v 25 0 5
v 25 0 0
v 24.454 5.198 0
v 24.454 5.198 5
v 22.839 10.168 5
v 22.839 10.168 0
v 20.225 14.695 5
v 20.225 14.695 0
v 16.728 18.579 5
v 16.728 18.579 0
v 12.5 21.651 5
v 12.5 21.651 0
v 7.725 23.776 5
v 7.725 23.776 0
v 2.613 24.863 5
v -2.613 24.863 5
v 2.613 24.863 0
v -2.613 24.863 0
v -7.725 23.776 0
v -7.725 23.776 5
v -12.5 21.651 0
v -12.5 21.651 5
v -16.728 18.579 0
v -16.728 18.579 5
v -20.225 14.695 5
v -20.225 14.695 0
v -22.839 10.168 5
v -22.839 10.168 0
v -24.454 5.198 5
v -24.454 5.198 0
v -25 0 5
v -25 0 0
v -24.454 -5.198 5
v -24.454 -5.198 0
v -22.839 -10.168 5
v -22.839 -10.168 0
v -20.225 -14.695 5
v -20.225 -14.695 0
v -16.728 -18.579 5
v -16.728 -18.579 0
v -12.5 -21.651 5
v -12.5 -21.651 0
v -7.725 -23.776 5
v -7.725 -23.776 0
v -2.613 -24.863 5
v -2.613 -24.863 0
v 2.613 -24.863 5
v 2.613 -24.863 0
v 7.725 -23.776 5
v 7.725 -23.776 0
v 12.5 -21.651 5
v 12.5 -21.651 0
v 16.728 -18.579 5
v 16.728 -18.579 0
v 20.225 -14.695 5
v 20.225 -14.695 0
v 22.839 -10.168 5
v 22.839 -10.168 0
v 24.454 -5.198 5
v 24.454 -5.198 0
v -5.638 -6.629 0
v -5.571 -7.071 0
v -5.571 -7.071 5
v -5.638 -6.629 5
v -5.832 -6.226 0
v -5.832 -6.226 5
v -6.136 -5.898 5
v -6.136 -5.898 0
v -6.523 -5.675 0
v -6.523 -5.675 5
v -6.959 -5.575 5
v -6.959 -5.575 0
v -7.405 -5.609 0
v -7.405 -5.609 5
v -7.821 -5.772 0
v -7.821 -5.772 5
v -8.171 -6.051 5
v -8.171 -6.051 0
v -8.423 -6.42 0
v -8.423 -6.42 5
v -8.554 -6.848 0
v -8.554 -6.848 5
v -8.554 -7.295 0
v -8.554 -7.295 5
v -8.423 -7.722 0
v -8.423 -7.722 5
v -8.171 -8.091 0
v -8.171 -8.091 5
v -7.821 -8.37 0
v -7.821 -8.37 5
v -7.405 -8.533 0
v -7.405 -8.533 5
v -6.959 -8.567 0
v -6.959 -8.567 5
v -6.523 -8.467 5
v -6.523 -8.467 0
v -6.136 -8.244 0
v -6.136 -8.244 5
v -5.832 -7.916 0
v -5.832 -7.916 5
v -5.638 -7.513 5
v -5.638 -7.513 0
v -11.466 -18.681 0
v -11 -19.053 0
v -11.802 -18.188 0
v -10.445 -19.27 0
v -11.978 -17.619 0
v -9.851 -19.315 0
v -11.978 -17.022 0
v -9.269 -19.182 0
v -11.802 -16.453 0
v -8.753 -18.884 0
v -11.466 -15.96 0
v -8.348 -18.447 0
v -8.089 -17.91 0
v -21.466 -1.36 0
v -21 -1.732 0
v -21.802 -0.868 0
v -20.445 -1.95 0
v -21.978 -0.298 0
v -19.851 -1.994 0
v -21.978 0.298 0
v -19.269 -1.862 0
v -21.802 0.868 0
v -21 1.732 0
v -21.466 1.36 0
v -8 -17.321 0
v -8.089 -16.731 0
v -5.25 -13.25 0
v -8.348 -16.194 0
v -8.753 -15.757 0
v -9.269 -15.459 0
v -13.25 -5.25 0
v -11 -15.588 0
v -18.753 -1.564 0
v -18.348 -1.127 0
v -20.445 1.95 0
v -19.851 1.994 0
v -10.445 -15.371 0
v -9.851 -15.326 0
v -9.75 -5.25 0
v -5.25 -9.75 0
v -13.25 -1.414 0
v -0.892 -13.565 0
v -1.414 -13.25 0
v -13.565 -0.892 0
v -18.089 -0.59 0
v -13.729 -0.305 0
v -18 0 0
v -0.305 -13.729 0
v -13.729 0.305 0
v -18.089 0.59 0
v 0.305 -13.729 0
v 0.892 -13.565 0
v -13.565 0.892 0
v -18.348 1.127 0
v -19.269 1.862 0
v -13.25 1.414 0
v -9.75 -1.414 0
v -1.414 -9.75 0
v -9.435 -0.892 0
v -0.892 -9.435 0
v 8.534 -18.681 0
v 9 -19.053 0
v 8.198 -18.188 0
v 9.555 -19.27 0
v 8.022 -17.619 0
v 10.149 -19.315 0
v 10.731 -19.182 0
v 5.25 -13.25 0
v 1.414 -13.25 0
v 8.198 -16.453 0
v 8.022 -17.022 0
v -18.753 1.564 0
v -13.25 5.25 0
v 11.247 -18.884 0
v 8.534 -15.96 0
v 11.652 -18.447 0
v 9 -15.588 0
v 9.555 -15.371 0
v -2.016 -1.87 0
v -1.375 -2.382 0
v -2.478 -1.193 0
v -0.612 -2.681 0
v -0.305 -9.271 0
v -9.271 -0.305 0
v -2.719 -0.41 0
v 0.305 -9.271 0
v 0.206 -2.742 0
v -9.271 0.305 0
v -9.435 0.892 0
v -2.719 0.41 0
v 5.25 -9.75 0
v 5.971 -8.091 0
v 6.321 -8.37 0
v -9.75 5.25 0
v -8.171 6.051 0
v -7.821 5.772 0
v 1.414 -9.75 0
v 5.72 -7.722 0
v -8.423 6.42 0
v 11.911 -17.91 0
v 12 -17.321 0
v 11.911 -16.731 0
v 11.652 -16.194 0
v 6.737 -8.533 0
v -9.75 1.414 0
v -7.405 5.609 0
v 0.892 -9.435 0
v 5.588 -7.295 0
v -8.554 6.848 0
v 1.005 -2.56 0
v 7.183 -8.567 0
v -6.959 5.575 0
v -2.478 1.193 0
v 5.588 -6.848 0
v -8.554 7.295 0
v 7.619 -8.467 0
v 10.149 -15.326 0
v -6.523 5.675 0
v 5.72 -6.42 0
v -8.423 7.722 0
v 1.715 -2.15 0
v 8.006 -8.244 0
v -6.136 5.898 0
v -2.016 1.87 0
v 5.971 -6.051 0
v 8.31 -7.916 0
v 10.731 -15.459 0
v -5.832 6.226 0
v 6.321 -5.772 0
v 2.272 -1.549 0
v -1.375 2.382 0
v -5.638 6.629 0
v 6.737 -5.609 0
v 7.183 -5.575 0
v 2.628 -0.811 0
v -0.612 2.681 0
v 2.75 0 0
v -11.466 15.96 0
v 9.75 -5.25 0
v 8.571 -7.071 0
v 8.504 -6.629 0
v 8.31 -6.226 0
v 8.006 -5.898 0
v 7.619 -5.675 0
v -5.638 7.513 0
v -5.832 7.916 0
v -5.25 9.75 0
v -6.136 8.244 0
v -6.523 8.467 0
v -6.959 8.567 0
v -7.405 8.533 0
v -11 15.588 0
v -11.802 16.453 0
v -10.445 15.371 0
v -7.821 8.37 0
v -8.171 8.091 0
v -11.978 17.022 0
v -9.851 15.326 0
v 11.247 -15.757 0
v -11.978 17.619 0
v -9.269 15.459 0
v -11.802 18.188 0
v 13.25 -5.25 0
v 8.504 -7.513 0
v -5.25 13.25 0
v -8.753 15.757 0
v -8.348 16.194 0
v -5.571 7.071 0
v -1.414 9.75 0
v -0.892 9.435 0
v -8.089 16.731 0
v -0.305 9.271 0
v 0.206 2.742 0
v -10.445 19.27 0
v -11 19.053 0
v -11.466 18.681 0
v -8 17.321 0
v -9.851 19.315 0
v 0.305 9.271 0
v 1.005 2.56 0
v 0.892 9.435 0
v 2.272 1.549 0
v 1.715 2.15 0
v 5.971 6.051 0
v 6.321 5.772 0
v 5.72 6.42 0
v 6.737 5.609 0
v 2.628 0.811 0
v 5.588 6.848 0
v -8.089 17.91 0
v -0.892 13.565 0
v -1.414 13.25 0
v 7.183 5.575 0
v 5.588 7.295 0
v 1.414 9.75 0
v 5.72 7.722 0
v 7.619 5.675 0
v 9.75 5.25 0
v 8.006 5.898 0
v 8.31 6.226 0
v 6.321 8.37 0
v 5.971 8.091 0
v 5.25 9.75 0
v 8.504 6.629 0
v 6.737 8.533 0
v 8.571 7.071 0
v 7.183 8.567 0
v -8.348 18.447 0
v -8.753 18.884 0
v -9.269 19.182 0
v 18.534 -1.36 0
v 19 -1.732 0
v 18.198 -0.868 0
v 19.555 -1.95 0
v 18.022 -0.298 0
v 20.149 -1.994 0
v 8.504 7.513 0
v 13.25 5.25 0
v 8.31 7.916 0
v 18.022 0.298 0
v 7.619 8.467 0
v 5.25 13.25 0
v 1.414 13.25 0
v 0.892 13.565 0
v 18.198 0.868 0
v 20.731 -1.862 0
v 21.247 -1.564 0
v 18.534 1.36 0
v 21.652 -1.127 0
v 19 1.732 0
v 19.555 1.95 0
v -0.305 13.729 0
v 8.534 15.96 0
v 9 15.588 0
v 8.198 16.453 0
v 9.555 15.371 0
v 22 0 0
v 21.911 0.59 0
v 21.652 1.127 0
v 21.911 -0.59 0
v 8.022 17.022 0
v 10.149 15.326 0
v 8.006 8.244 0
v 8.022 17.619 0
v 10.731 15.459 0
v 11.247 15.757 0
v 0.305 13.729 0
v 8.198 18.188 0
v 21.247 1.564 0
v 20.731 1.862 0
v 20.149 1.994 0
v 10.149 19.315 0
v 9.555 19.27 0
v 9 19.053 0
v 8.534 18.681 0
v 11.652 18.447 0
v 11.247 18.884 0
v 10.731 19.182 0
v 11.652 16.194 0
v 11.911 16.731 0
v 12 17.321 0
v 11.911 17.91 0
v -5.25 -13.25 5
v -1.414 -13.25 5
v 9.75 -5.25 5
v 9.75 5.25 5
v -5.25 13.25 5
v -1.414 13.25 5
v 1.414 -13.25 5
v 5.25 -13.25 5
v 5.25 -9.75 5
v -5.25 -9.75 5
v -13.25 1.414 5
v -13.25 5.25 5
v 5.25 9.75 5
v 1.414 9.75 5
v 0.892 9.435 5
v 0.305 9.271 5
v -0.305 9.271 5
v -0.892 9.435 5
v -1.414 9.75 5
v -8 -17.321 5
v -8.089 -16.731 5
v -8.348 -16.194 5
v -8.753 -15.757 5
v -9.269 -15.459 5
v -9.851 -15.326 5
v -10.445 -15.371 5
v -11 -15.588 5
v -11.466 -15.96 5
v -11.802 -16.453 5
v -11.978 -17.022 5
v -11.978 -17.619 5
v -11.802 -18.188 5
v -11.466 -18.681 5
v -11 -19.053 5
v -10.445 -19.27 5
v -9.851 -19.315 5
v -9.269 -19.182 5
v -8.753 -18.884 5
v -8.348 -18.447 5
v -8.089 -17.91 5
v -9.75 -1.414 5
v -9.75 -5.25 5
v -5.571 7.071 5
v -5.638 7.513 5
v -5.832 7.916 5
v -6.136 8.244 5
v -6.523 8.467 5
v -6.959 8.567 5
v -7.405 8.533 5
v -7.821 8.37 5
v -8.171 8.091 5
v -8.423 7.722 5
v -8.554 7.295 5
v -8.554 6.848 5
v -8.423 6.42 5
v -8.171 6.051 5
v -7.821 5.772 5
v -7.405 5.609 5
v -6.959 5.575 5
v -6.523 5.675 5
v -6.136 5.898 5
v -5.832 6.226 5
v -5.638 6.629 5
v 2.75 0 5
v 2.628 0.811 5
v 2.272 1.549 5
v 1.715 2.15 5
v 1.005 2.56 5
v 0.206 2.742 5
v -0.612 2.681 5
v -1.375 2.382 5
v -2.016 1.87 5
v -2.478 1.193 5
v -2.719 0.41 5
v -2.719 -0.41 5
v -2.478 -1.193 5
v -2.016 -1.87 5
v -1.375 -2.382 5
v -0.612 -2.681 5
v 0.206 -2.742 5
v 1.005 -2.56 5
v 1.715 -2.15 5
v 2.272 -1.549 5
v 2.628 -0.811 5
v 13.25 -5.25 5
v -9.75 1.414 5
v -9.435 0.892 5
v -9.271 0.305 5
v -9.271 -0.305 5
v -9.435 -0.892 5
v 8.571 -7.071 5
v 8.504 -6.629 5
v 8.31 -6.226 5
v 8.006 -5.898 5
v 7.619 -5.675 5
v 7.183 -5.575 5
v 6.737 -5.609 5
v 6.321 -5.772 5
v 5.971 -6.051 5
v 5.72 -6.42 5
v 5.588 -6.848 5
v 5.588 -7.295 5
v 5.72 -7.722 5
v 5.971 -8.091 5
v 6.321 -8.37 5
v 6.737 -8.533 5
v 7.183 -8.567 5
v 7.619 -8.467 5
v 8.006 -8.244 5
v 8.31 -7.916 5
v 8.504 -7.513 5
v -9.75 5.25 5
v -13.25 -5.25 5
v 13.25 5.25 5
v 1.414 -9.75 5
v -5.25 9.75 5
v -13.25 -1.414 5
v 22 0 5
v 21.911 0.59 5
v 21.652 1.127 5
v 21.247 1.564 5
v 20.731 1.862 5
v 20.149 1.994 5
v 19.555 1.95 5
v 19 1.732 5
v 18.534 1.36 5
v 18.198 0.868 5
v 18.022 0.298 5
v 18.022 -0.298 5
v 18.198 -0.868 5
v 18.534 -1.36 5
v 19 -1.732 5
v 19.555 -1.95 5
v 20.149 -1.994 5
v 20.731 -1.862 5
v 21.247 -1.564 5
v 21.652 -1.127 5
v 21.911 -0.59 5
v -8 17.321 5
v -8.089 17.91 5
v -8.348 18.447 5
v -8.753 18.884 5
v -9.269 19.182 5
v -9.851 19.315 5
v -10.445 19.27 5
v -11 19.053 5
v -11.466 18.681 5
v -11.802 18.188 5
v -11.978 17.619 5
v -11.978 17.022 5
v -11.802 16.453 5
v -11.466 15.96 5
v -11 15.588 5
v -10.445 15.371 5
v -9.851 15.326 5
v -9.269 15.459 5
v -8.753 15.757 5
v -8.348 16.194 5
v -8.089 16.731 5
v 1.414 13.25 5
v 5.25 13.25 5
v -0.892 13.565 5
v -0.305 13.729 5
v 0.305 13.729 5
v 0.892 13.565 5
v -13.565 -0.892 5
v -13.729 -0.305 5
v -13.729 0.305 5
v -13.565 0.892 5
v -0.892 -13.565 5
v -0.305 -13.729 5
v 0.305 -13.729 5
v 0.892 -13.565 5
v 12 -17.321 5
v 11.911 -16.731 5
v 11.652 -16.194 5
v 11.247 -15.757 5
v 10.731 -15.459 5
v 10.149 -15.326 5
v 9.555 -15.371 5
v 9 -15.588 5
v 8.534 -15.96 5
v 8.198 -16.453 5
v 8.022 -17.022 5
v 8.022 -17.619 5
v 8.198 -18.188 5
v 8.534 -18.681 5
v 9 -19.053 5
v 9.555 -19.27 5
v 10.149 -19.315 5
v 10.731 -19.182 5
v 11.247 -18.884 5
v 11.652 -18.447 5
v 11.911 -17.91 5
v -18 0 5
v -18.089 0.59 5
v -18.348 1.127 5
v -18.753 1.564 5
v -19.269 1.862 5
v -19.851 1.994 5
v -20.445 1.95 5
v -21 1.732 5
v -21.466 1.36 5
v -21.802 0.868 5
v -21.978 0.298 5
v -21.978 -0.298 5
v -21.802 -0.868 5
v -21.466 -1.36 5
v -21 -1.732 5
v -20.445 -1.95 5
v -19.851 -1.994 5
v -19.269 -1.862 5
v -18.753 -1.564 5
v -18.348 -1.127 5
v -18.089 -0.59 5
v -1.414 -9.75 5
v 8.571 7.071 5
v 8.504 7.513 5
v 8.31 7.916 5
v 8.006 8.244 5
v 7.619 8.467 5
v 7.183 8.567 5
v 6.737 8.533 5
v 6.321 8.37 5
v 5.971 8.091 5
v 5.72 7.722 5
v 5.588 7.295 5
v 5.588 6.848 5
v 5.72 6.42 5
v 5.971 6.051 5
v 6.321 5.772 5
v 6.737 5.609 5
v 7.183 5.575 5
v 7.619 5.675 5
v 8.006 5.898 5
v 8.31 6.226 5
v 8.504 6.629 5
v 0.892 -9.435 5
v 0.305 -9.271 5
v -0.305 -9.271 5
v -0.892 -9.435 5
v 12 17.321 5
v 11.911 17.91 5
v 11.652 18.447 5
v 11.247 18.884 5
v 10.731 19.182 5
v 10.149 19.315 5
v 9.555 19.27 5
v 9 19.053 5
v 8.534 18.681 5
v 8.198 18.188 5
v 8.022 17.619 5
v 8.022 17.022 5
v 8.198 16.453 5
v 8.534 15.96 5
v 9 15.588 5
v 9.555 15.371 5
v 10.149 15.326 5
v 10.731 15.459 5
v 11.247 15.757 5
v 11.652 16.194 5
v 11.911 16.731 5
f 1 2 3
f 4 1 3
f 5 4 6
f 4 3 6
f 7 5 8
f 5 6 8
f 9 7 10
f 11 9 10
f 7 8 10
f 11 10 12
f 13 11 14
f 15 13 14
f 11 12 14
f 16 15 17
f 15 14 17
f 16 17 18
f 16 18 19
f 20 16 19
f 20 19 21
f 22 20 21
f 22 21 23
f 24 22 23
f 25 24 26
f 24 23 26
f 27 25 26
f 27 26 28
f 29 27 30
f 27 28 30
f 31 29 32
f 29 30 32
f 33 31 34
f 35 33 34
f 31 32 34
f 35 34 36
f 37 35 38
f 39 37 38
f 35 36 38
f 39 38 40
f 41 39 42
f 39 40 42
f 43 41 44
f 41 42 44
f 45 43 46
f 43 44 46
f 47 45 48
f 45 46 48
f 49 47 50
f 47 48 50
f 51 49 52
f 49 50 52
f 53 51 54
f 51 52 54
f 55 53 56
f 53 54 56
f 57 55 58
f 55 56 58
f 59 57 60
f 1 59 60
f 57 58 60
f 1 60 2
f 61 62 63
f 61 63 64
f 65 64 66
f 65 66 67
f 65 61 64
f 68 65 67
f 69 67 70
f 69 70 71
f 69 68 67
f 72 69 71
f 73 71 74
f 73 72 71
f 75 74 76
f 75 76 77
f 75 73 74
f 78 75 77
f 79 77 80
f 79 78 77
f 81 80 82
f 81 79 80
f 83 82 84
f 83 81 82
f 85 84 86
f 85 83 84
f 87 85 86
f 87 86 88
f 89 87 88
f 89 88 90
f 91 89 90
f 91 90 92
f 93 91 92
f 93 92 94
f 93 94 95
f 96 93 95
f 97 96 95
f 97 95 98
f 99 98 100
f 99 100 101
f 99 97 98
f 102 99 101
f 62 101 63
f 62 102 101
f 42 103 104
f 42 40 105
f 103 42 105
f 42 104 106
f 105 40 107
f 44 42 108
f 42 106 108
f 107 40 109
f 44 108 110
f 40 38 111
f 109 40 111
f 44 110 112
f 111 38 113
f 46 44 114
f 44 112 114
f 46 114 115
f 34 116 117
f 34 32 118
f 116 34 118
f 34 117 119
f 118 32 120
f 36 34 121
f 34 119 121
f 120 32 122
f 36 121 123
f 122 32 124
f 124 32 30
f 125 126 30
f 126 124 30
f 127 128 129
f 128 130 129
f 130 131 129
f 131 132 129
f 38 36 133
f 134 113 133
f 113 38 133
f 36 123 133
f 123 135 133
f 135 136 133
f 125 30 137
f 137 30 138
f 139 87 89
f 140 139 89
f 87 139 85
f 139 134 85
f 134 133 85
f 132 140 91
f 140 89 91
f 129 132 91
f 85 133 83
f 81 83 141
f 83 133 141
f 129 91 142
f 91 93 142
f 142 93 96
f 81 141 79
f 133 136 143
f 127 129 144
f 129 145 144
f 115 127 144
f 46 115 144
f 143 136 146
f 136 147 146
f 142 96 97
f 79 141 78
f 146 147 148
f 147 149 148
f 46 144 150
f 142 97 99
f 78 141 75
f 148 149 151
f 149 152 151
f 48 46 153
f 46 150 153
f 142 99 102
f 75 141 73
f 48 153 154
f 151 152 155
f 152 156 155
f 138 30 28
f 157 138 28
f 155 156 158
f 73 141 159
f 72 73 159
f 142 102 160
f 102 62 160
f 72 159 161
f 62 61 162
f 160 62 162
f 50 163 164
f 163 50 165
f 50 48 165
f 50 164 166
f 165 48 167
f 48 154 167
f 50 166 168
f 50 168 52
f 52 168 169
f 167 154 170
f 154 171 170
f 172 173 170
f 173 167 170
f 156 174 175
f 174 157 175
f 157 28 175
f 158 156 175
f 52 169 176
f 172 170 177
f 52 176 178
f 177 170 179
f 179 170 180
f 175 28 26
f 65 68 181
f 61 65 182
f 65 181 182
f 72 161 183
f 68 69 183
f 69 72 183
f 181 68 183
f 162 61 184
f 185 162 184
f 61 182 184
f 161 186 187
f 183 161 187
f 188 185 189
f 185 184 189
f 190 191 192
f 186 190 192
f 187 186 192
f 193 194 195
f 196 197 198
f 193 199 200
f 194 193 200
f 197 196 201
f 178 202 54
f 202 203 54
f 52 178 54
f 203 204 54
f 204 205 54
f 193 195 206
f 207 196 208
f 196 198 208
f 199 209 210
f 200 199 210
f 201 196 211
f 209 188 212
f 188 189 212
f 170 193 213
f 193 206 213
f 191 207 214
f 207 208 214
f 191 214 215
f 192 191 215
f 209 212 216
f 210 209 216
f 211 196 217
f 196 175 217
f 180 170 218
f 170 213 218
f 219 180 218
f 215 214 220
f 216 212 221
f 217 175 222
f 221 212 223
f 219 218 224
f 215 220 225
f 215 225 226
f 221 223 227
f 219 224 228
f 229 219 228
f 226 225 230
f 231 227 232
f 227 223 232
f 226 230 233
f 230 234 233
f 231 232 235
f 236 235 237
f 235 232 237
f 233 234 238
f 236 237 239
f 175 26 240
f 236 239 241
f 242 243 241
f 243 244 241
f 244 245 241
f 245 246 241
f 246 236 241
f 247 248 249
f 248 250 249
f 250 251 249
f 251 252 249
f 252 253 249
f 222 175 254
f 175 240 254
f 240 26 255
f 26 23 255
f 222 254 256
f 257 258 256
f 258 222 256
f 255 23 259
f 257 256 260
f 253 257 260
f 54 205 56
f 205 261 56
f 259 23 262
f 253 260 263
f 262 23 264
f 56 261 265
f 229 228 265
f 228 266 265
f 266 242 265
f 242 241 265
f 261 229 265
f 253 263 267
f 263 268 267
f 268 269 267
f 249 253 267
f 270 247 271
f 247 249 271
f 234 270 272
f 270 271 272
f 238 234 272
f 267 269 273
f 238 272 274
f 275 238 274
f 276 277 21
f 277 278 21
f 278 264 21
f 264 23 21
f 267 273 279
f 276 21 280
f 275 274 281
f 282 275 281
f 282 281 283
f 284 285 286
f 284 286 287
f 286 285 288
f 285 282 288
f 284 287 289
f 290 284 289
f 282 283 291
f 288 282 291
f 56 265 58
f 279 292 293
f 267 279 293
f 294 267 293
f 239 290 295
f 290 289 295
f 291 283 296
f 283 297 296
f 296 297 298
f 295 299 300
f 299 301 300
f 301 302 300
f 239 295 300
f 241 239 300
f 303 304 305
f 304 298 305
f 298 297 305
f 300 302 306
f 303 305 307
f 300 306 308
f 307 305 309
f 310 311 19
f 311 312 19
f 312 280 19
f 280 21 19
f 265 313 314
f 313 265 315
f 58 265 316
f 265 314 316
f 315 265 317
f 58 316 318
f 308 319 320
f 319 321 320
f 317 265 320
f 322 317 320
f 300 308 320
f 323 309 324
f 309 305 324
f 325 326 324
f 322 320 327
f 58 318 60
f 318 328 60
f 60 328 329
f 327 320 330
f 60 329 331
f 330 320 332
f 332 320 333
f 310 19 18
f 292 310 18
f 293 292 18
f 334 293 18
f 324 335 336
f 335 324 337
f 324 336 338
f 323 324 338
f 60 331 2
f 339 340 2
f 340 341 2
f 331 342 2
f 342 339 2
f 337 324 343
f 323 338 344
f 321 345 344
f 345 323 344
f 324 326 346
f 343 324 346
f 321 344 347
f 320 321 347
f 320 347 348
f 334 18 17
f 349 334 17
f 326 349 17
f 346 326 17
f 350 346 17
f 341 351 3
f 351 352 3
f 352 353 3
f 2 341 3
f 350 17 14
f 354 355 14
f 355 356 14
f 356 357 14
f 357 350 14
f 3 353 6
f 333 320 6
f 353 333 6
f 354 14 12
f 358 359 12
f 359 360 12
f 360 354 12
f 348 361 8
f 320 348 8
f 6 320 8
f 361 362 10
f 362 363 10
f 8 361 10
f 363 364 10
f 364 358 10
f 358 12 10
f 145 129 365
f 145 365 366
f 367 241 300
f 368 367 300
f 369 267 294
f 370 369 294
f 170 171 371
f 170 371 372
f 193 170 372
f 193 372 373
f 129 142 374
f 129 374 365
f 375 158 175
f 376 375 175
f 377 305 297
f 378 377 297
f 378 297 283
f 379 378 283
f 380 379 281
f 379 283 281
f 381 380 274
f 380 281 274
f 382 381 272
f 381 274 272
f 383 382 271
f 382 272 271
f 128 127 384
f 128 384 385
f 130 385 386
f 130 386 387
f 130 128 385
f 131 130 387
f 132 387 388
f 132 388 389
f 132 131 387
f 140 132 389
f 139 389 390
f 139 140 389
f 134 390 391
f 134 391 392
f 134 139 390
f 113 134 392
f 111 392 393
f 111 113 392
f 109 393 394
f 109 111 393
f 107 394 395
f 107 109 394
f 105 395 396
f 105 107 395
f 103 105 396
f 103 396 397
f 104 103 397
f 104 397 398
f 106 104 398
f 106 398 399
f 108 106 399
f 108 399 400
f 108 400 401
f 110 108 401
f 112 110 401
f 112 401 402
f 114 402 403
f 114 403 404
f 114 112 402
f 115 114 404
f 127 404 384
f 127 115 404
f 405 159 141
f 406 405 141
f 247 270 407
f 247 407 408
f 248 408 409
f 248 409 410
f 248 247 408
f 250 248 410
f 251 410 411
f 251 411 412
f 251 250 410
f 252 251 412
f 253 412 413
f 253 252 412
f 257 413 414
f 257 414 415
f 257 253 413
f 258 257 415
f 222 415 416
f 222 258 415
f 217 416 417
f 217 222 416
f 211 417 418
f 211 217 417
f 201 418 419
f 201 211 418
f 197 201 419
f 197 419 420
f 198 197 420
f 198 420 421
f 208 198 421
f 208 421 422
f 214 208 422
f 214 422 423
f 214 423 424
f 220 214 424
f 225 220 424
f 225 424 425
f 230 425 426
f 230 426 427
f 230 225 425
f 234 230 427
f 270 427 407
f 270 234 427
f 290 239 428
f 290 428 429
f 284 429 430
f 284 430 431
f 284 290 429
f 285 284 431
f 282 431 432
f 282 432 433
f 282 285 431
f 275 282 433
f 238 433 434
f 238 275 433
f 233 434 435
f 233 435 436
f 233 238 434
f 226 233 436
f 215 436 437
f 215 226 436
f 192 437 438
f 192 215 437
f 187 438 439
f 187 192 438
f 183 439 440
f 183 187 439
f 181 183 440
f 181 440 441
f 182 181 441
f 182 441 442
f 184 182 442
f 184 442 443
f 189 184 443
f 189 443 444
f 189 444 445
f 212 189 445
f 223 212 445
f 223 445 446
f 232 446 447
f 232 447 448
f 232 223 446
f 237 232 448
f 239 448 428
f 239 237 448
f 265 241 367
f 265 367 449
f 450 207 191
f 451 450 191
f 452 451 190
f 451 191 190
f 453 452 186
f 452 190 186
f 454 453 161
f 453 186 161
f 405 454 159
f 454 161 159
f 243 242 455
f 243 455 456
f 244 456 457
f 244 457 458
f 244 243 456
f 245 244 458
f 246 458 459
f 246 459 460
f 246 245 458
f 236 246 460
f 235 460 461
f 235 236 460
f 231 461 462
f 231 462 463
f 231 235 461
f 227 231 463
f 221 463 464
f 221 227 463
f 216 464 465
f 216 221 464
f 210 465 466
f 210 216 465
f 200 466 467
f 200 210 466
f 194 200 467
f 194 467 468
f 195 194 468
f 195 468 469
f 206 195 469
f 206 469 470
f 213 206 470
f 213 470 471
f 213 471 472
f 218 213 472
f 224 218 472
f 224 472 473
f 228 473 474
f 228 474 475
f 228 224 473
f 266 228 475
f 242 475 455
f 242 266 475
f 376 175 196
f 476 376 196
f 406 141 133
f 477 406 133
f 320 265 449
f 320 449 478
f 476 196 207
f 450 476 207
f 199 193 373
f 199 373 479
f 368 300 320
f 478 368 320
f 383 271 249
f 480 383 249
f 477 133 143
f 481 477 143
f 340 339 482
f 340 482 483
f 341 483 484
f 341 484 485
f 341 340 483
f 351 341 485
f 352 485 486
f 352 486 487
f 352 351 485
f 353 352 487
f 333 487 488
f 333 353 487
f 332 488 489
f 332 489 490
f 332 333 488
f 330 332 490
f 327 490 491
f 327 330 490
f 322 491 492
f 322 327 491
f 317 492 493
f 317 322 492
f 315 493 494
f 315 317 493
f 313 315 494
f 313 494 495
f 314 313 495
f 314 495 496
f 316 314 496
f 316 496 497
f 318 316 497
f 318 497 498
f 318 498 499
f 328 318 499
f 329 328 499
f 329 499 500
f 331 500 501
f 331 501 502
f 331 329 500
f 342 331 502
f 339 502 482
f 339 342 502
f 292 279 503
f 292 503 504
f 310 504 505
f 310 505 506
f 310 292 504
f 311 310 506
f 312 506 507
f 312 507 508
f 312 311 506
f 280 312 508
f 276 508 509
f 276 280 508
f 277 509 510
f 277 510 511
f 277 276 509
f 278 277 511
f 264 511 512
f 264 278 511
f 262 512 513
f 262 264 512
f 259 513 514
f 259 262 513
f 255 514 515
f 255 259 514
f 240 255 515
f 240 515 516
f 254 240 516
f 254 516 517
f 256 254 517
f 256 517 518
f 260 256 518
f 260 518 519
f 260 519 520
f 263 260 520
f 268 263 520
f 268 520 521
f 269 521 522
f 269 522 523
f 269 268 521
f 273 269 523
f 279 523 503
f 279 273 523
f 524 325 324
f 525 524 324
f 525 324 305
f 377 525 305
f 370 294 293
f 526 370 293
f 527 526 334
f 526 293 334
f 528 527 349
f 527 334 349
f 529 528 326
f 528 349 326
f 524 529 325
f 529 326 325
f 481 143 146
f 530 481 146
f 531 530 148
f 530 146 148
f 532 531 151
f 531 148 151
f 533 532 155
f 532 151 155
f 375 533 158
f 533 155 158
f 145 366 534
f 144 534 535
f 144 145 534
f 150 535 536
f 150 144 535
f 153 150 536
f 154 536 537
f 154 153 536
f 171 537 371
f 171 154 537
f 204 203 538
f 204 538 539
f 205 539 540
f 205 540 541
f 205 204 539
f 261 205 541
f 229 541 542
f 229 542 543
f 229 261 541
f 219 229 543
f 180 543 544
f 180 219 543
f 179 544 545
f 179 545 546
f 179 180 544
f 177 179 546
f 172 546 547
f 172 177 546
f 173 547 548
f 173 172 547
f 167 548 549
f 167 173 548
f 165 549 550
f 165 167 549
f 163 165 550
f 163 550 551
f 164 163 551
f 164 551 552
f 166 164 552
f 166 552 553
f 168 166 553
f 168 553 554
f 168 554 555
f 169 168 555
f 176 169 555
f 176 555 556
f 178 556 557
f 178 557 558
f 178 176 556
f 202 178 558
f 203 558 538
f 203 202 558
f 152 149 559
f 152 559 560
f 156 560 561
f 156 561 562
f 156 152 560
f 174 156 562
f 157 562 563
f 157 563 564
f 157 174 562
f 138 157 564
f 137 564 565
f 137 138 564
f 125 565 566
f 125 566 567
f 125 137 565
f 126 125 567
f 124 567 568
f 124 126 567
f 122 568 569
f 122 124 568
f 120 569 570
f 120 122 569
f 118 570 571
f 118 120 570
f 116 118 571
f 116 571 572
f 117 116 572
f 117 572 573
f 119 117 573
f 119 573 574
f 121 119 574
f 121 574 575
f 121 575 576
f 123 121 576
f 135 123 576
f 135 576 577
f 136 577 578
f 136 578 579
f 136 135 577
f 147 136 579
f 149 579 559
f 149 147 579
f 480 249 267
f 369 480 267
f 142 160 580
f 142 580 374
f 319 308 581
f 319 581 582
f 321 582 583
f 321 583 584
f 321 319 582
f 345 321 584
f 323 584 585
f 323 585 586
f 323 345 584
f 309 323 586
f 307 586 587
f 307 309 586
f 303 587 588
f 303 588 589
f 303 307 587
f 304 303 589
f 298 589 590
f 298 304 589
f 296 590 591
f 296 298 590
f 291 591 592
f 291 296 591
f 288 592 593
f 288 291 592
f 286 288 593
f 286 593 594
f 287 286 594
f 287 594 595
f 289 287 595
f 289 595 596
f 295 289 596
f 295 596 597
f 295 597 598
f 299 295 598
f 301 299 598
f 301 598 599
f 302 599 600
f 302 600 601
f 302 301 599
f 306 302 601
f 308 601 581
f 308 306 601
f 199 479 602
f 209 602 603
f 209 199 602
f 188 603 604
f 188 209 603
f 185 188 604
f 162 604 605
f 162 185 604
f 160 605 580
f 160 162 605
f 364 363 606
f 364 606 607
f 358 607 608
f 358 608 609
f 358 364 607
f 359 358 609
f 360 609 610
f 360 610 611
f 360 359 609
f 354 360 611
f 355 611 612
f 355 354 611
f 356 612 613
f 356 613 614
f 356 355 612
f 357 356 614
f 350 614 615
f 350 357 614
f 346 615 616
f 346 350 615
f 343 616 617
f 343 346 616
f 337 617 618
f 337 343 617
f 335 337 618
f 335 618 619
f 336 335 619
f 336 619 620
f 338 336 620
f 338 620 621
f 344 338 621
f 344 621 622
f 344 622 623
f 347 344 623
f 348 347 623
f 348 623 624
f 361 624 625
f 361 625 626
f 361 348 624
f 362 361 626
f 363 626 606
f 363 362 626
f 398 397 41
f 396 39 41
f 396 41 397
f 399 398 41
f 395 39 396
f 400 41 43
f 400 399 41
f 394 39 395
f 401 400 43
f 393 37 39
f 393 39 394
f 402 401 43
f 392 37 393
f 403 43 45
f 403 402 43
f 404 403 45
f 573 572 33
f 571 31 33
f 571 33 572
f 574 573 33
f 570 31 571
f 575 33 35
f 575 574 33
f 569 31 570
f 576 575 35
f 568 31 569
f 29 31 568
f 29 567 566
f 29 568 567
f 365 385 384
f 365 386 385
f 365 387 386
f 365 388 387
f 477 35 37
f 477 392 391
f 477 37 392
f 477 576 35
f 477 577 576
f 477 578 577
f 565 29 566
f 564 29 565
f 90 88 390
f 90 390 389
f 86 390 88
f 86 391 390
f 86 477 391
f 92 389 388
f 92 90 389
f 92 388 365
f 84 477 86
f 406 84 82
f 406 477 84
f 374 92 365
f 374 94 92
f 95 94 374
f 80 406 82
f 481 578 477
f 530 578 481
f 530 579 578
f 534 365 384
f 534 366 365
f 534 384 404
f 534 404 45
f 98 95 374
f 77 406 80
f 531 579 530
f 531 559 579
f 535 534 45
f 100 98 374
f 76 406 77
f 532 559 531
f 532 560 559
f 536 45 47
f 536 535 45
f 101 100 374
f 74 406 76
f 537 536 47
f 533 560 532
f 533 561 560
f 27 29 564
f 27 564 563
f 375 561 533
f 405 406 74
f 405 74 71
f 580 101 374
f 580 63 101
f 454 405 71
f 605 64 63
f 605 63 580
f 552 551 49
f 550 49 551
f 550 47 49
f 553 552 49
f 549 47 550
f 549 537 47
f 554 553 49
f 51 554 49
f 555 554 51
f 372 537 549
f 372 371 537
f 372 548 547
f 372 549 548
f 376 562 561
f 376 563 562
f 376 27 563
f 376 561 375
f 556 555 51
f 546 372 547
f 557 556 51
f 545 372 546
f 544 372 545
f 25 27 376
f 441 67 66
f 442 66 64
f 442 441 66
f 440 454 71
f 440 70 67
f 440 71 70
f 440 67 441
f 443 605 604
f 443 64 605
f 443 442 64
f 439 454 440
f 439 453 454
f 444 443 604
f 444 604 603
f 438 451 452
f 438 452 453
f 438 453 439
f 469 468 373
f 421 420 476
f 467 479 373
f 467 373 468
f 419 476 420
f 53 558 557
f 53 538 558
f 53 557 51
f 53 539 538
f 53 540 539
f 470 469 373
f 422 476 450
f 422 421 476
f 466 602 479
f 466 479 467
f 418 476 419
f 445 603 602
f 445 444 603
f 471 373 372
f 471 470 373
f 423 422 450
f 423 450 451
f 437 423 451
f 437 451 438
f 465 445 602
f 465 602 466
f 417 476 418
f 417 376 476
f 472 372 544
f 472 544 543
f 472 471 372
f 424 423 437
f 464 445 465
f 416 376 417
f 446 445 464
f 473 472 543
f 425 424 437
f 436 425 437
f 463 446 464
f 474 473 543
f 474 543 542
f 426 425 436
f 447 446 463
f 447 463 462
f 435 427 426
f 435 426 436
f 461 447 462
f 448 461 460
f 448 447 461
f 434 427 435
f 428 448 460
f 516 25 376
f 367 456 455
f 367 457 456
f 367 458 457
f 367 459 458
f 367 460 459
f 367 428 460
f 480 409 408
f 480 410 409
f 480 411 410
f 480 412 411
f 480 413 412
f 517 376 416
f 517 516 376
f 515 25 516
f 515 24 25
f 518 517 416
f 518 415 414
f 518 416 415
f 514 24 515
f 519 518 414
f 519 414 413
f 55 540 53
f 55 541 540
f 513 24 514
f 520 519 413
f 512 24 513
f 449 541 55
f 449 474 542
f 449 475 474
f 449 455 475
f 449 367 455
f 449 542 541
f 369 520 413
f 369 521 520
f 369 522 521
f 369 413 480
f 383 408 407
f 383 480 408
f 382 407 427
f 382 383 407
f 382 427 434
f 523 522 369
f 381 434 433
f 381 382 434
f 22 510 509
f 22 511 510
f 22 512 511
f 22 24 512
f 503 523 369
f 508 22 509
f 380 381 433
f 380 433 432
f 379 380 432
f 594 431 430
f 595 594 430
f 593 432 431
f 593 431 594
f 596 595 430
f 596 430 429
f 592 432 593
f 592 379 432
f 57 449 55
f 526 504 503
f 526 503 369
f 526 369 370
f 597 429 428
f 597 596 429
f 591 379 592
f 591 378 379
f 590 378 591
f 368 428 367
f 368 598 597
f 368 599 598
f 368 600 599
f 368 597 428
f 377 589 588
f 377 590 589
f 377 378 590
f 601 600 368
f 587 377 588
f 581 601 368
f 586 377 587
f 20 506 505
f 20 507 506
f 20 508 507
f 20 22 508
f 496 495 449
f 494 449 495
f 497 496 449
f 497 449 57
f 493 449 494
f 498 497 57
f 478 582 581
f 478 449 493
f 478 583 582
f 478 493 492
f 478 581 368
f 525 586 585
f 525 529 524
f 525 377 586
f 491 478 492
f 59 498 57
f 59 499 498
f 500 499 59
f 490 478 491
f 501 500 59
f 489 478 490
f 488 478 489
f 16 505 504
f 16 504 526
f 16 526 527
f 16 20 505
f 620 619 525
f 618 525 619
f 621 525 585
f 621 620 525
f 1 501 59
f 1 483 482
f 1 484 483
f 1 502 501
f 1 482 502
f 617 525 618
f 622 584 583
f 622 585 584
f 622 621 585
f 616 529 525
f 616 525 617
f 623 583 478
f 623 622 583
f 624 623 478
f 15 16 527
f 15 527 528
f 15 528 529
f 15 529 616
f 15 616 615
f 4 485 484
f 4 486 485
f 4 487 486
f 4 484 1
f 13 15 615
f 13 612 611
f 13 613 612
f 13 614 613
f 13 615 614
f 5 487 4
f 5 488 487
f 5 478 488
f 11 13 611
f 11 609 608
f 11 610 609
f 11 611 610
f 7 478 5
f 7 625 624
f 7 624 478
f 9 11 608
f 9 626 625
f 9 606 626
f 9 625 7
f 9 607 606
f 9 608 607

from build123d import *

# Parameters (mm, degrees)
SKETCH_1_R          = 25
SKETCH_1_W          = 3
SKETCH_1_H          = 10
SKETCH_1_R_2        = 2
SKETCH_1_R_3        = 1.5
SKETCH_1_R_4        = 2.75
EXTRUDE_1_DEPTH     = 5
CUT_EXTRUDE_START   = -10
SKETCH_3_W          = 3.5
SKETCH_3_H          = 10.5
SKETCH_3_W_2        = 3
SKETCH_3_H_2        = 10
CUT_EXTRUDE_1_DEPTH = 10


with BuildPart() as part:
    # 草图1 → 凸台-拉伸1 (new body)
    with BuildSketch(Plane.XY):
        Circle(SKETCH_1_R)
        with Locations((11.5, 0)):
            Rectangle(SKETCH_1_W, SKETCH_1_H, mode=Mode.SUBTRACT)
        with Locations((-10, -17.320508076)):
            Circle(SKETCH_1_R_2, mode=Mode.SUBTRACT)
        with Locations((-7.071067812, -7.071067812)):
            Circle(SKETCH_1_R_3, mode=Mode.SUBTRACT)
        with BuildLine():
            Line((-10, -1.322875656), (-10, -5))
            Line((-10, -5), (-13, -5))
            Line((-13, -5), (-13, -1.322875656))
            ThreePointArc((-13, -1.322875656), (-13.5, 0), (-13, 1.322875656))
            Line((-13, 1.322875656), (-13, 5))
            Line((-13, 5), (-10, 5))
            Line((-10, 5), (-10, 1.322875656))
            ThreePointArc((-10, 1.322875656), (-9.5, 0), (-10, -1.322875656))
        make_face(mode=Mode.SUBTRACT)
        with Locations((10, -17.320508076)):
            Circle(SKETCH_1_R_2, mode=Mode.SUBTRACT)
        with BuildLine():
            Line((1.322875656, -10), (5, -10))
            Line((5, -10), (5, -13))
            Line((5, -13), (1.322875656, -13))
            ThreePointArc((1.322875656, -13), (0, -13.5), (-1.322875656, -13))
            Line((-1.322875656, -13), (-5, -13))
            Line((-5, -13), (-5, -10))
            Line((-5, -10), (-1.322875656, -10))
            ThreePointArc((-1.322875656, -10), (0, -9.5), (1.322875656, -10))
        make_face(mode=Mode.SUBTRACT)
        with Locations((7.071067812, -7.071067812)):
            Circle(SKETCH_1_R_3, mode=Mode.SUBTRACT)
        with Locations((-20, 0)):
            Circle(SKETCH_1_R_2, mode=Mode.SUBTRACT)
        with Locations((-7.071067812, 7.071067812)):
            Circle(SKETCH_1_R_3, mode=Mode.SUBTRACT)
        with BuildLine():
            Line((-1.322875656, 10), (-5, 10))
            Line((-5, 10), (-5, 13))
            Line((-5, 13), (-1.322875656, 13))
            ThreePointArc((-1.322875656, 13), (0, 13.5), (1.322875656, 13))
            Line((1.322875656, 13), (5, 13))
            Line((5, 13), (5, 10))
            Line((5, 10), (1.322875656, 10))
            ThreePointArc((1.322875656, 10), (0, 9.5), (-1.322875656, 10))
        make_face(mode=Mode.SUBTRACT)
        with Locations((-10, 17.320508076)):
            Circle(SKETCH_1_R_2, mode=Mode.SUBTRACT)
        Circle(SKETCH_1_R_4, mode=Mode.SUBTRACT)
        with Locations((10, 17.320508076)):
            Circle(SKETCH_1_R_2, mode=Mode.SUBTRACT)
        with Locations((7.071067812, 7.071067812)):
            Circle(SKETCH_1_R_3, mode=Mode.SUBTRACT)
        with Locations((20, 0)):
            Circle(SKETCH_1_R_2, mode=Mode.SUBTRACT)
    extrude(amount=EXTRUDE_1_DEPTH)

    # 草图3 → 切除-拉伸1 (cut)
    # profile 1 of 4: a face of its own
    with BuildSketch(Plane.XY.offset(5).offset(CUT_EXTRUDE_START)):
        with BuildLine():
            Line((-5.25, 9.75), (-5.25, 13.25))
            Line((-5.25, 13.25), (-1.414213562, 13.25))
            ThreePointArc((-1.414213562, 13.25), (0, 13.75), (1.414213562, 13.25))
            Line((1.414213562, 13.25), (5.25, 13.25))
            Line((5.25, 13.25), (5.25, 9.75))
            Line((5.25, 9.75), (1.414213562, 9.75))
            ThreePointArc((1.414213562, 9.75), (0, 9.25), (-1.414213562, 9.75))
            Line((-1.414213562, 9.75), (-5.25, 9.75))
        make_face()
        with BuildLine():
            Line((-5, 10), (-5, 13))
            Line((-5, 13), (-1.322875656, 13))
            ThreePointArc((-1.322875656, 13), (0, 13.5), (1.322875656, 13))
            Line((1.322875656, 13), (5, 13))
            Line((5, 13), (5, 10))
            Line((5, 10), (1.322875656, 10))
            ThreePointArc((1.322875656, 10), (0, 9.5), (-1.322875656, 10))
            Line((-1.322875656, 10), (-5, 10))
        make_face(mode=Mode.SUBTRACT)
    # profile 2 of 4: a face of its own
    with BuildSketch(Plane.XY.offset(5).offset(CUT_EXTRUDE_START)):
        with BuildLine():
            Line((-13.25, -5.25), (-13.25, -1.414213562))
            ThreePointArc((-13.25, -1.414213562), (-13.75, 0), (-13.25, 1.414213562))
            Line((-13.25, 1.414213562), (-13.25, 5.25))
            Line((-13.25, 5.25), (-9.75, 5.25))
            Line((-9.75, 5.25), (-9.75, 1.414213562))
            ThreePointArc((-9.75, 1.414213562), (-9.25, 0), (-9.75, -1.414213562))
            Line((-9.75, -1.414213562), (-9.75, -5.25))
            Line((-9.75, -5.25), (-13.25, -5.25))
        make_face()
        with BuildLine():
            Line((-13, -5), (-13, -1.322875656))
            ThreePointArc((-13, -1.322875656), (-13.5, 0), (-13, 1.322875656))
            Line((-13, 1.322875656), (-13, 5))
            Line((-13, 5), (-10, 5))
            Line((-10, 5), (-10, 1.322875656))
            ThreePointArc((-10, 1.322875656), (-9.5, 0), (-10, -1.322875656))
            Line((-10, -1.322875656), (-10, -5))
            Line((-10, -5), (-13, -5))
        make_face(mode=Mode.SUBTRACT)
    # profile 3 of 4: a face of its own
    with BuildSketch(Plane.XY.offset(5).offset(CUT_EXTRUDE_START)):
        with BuildLine():
            Line((5.25, -9.75), (1.414213562, -9.75))
            ThreePointArc((1.414213562, -9.75), (0, -9.25), (-1.414213562, -9.75))
            Line((-1.414213562, -9.75), (-5.25, -9.75))
            Line((-5.25, -9.75), (-5.25, -13.25))
            Line((-5.25, -13.25), (-1.414213562, -13.25))
            ThreePointArc((-1.414213562, -13.25), (0, -13.75), (1.414213562, -13.25))
            Line((1.414213562, -13.25), (5.25, -13.25))
            Line((5.25, -13.25), (5.25, -9.75))
        make_face()
        with BuildLine():
            Line((5, -10), (1.322875656, -10))
            ThreePointArc((1.322875656, -10), (0, -9.5), (-1.322875656, -10))
            Line((-1.322875656, -10), (-5, -10))
            Line((-5, -10), (-5, -13))
            Line((-5, -13), (-1.322875656, -13))
            ThreePointArc((-1.322875656, -13), (0, -13.5), (1.322875656, -13))
            Line((1.322875656, -13), (5, -13))
            Line((5, -13), (5, -10))
        make_face(mode=Mode.SUBTRACT)
    # profile 4 of 4: a face of its own
    with BuildSketch(Plane.XY.offset(5).offset(CUT_EXTRUDE_START)):
        with Locations((11.5, 0)):
            Rectangle(SKETCH_3_W, SKETCH_3_H)
        with Locations((11.5, 0)):
            Rectangle(SKETCH_3_W_2, SKETCH_3_H_2, mode=Mode.SUBTRACT)
    extrude(amount=CUT_EXTRUDE_1_DEPTH, mode=Mode.SUBTRACT)


solid = part.part
